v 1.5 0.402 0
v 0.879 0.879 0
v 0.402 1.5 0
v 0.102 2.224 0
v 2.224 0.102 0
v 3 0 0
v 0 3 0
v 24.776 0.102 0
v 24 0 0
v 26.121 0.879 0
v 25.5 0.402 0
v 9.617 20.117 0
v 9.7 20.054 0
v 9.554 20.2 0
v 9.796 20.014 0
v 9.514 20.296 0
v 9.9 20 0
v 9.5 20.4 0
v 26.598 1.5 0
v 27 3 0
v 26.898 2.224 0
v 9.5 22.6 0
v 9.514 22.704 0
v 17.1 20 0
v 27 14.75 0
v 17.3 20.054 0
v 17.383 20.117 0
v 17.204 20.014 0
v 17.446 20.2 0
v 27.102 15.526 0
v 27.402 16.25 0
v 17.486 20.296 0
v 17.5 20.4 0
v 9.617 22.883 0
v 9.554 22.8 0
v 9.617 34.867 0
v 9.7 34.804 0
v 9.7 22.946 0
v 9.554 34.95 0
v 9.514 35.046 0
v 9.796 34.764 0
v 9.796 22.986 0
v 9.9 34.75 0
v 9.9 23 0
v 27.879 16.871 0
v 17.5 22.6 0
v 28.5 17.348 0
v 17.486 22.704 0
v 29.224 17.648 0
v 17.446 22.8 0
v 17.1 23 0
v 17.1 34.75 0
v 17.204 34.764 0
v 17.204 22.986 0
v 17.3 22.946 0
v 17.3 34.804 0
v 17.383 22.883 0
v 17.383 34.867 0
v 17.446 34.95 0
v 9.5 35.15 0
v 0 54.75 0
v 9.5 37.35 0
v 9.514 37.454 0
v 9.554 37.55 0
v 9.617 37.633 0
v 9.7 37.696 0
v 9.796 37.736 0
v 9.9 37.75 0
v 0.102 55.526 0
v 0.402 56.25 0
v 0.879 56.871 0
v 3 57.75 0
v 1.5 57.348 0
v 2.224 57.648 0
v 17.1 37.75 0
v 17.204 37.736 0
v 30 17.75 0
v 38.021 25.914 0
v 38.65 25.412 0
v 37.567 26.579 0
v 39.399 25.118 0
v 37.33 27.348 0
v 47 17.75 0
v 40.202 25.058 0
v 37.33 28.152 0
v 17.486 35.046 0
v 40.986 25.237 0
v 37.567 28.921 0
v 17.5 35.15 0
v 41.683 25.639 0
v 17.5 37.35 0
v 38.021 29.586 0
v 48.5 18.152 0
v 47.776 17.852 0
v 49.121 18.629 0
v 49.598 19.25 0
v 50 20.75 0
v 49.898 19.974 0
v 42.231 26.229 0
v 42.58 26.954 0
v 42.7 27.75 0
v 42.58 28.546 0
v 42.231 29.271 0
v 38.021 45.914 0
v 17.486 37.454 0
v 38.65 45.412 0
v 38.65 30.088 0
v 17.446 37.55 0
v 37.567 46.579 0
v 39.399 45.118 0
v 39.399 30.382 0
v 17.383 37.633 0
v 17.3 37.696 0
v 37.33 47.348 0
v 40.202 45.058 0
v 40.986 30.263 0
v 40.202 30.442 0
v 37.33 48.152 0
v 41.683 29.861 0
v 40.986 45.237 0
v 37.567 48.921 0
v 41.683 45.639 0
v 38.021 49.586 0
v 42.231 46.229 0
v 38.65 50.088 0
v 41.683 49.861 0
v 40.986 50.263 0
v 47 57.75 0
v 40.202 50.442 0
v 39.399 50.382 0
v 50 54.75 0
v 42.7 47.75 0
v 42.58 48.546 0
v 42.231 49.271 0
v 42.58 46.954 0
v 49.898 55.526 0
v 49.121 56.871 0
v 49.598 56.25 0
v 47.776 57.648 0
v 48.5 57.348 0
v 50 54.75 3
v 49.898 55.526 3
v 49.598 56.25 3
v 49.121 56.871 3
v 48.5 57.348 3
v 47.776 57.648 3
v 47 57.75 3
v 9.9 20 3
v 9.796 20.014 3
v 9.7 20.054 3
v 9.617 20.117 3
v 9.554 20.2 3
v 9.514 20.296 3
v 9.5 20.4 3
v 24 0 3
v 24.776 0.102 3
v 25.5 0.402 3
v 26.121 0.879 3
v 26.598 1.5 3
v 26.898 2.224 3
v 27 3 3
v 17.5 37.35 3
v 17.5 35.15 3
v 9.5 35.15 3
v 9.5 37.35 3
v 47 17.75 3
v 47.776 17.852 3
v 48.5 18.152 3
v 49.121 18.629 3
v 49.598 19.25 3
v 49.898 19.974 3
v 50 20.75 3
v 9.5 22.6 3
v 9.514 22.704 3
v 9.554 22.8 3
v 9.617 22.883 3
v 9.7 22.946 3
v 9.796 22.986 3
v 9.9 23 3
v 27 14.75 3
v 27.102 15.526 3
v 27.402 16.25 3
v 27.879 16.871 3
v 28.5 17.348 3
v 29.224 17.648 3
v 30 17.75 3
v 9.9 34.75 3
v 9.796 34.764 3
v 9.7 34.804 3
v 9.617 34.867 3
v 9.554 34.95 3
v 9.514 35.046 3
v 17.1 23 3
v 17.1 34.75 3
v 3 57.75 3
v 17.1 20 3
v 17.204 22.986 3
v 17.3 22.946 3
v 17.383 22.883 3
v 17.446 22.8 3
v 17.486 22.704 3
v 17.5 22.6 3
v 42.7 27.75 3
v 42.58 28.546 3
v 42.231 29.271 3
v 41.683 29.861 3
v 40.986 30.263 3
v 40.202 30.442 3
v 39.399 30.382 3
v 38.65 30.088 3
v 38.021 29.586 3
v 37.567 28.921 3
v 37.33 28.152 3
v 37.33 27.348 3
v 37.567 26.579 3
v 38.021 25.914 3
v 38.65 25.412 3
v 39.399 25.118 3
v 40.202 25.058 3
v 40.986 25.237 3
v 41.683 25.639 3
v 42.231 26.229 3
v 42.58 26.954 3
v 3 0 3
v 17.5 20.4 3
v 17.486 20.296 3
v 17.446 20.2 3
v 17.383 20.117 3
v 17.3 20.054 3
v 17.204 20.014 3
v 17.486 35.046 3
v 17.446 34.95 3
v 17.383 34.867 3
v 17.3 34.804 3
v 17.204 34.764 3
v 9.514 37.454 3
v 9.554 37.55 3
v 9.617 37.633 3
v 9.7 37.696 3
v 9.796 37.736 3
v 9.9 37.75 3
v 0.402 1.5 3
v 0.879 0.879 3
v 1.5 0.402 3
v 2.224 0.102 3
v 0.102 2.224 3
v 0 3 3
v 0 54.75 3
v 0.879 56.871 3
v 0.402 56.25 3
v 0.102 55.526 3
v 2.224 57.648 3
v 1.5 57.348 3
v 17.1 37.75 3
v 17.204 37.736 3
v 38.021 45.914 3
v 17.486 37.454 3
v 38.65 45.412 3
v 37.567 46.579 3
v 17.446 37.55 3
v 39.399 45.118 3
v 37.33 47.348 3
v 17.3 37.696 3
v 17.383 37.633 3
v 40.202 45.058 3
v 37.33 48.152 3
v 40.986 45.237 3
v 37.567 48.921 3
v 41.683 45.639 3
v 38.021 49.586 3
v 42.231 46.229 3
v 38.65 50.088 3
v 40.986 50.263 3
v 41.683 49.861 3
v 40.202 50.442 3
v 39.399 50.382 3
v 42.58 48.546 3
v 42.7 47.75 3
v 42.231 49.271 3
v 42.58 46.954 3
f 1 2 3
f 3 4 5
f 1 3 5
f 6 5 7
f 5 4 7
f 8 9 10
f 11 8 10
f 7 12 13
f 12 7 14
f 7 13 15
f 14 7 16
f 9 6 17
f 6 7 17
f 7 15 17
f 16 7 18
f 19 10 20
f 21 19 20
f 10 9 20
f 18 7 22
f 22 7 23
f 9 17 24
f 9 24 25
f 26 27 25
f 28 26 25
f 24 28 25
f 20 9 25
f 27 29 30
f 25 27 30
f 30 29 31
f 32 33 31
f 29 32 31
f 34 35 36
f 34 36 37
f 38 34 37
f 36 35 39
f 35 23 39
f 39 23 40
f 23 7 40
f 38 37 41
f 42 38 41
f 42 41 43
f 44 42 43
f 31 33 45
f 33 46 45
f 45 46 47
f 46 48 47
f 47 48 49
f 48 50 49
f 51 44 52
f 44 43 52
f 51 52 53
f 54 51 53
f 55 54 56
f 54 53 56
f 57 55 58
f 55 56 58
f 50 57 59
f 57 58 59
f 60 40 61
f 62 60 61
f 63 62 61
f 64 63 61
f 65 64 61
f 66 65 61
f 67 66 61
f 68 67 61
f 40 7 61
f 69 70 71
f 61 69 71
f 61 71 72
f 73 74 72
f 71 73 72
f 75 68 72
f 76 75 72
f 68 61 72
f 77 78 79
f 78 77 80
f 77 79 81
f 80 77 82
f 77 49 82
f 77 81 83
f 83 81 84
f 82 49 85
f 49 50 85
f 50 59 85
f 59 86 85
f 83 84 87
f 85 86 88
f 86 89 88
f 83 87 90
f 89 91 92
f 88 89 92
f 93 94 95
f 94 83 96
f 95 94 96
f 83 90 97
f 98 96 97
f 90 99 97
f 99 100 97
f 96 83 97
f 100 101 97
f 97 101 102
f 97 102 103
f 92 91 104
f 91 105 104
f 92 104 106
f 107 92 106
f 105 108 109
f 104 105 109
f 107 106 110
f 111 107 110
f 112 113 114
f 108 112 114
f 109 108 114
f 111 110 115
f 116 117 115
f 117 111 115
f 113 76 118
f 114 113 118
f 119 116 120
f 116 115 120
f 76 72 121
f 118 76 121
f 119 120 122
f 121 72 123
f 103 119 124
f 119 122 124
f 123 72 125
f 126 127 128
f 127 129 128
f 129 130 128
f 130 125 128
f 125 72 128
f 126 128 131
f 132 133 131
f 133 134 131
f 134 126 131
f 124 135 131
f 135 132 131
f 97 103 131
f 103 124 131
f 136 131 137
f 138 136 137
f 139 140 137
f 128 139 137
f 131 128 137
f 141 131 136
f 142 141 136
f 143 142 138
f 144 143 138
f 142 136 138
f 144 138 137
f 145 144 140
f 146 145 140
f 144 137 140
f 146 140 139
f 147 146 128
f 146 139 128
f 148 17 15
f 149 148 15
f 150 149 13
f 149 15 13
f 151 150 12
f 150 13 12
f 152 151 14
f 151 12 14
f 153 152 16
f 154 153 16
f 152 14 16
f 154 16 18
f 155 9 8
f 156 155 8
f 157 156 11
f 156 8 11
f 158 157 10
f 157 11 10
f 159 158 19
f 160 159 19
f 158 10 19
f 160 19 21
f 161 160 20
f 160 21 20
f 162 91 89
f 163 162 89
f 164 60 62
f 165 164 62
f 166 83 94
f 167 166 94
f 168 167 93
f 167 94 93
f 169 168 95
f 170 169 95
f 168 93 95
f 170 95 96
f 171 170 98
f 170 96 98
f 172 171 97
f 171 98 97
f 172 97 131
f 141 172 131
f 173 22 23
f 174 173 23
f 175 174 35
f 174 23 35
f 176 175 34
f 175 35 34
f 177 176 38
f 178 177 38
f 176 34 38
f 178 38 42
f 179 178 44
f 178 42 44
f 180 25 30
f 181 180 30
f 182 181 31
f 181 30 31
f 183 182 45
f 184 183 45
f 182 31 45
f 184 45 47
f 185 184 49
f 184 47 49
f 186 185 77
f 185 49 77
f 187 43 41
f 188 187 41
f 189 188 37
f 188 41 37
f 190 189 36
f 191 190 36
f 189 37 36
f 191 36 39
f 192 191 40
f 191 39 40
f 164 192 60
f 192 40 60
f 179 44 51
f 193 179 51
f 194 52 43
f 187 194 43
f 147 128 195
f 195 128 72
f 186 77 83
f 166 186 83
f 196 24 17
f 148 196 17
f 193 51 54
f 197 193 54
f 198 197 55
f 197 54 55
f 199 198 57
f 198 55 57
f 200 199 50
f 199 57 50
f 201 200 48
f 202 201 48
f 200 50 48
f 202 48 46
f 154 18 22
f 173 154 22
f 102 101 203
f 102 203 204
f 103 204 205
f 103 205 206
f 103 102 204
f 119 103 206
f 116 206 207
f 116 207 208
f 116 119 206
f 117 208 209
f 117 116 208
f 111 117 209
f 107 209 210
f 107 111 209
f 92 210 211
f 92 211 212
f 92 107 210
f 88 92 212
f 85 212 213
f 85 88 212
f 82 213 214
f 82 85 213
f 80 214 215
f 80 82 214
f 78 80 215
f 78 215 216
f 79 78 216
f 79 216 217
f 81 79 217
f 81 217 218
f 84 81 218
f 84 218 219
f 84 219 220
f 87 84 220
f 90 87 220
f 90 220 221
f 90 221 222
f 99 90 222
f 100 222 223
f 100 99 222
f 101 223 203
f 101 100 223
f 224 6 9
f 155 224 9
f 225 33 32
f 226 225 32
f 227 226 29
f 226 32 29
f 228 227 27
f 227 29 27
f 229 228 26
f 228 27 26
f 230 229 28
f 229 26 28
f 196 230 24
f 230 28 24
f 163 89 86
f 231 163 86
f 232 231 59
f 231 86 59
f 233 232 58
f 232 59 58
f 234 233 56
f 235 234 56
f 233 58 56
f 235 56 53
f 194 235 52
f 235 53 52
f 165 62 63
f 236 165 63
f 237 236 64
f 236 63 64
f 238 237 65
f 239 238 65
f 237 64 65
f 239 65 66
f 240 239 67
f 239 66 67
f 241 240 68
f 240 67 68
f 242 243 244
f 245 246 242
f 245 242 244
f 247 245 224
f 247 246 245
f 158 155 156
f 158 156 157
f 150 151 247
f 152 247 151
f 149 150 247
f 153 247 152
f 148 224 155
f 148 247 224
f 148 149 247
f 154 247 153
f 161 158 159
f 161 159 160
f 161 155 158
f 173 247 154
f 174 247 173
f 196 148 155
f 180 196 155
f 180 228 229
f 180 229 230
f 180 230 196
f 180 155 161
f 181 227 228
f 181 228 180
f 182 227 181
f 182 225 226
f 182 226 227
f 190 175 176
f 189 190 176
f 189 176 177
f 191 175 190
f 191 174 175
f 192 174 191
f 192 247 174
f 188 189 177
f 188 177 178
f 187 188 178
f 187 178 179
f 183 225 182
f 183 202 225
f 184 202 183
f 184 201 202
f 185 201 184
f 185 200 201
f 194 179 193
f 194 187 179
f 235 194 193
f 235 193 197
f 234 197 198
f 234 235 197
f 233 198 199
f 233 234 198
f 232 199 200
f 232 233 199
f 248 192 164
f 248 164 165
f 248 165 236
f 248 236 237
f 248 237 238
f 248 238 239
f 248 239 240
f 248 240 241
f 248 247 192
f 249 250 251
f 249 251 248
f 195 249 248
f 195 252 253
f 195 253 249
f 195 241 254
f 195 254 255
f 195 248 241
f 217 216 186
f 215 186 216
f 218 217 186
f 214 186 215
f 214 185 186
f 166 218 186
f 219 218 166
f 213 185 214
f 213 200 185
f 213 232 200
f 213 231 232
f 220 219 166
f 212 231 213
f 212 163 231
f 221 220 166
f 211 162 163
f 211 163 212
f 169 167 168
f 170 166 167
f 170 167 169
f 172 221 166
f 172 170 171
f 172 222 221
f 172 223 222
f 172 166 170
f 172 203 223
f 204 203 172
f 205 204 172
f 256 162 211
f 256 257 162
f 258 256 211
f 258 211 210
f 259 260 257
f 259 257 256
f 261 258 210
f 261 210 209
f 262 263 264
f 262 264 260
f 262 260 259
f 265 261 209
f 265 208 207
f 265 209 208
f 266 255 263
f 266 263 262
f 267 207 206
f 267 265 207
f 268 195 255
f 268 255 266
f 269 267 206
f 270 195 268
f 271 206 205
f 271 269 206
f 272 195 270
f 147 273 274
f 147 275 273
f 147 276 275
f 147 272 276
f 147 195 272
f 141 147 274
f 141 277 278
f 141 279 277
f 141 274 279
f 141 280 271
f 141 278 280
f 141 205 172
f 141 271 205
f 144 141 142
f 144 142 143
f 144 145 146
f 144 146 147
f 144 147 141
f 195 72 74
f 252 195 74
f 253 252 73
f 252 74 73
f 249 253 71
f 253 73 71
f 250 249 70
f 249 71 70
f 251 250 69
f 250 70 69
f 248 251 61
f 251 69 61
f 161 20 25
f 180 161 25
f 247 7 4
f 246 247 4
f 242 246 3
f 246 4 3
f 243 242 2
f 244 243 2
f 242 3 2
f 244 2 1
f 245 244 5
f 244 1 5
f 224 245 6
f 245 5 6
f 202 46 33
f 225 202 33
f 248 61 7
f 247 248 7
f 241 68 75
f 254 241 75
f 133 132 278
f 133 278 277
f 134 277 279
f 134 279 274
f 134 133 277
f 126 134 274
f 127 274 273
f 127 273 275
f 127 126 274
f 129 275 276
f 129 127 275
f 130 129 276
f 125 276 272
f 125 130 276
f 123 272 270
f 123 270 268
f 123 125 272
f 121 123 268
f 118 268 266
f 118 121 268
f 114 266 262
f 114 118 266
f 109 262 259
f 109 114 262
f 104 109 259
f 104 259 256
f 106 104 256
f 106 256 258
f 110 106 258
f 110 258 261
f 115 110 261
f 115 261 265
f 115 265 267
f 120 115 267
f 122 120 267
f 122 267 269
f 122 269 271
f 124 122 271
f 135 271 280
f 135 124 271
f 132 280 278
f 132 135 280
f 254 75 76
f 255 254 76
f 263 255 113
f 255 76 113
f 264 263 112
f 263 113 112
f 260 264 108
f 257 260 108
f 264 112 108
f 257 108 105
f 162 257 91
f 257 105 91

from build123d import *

# Parameters (mm, degrees)
MODEL_R                         = 2.7
AUFSATZ_LINEAR_AUSTRAGEN1_DEPTH = 3


with BuildPart() as part:
    # Model → Aufsatz-Linear austragen1 (new body)
    with BuildSketch(Plane.XY):
        with BuildLine():
            Line((50, 20.75), (50, 54.75))
            ThreePointArc((50, 54.75), (49.121320344, 56.871320344), (47, 57.75))
            Line((47, 57.75), (3, 57.75))
            ThreePointArc((3, 57.75), (0.878679656, 56.871320344), (0, 54.75))
            Line((0, 54.75), (0, 3))
            ThreePointArc((0, 3), (0.878679656, 0.878679656), (3, 0))
            Line((3, 0), (24, 0))
            ThreePointArc((24, 0), (26.121320344, 0.878679656), (27, 3))
            Line((27, 3), (27, 14.75))
            ThreePointArc((27, 14.75), (27.878679656, 16.871320344), (30, 17.75))
            Line((30, 17.75), (47, 17.75))
            ThreePointArc((47, 17.75), (49.121320344, 18.628679656), (50, 20.75))
        make_face()
        with Locations((40, 27.75)):
            Circle(MODEL_R, mode=Mode.SUBTRACT)
        with Locations((40, 47.75)):
            Circle(MODEL_R, mode=Mode.SUBTRACT)
        with BuildLine():
            Line((17.1, 34.75), (9.9, 34.75))
            ThreePointArc((9.9, 34.75), (9.617157288, 34.867157288), (9.5, 35.15))
            Line((9.5, 35.15), (9.5, 37.35))
            ThreePointArc((9.5, 37.35), (9.617157288, 37.632842712), (9.9, 37.75))
            Line((9.9, 37.75), (17.1, 37.75))
            ThreePointArc((17.1, 37.75), (17.382842712, 37.632842712), (17.5, 37.35))
            Line((17.5, 37.35), (17.5, 35.15))
            ThreePointArc((17.5, 35.15), (17.382842712, 34.867157288), (17.1, 34.75))
        make_face(mode=Mode.SUBTRACT)
        with BuildLine():
            Line((17.100000028, 20.000000104), (9.900000028, 20.000000104))
            ThreePointArc((9.900000028, 20.000000104), (9.617157315, 20.117157391), (9.500000028, 20.400000104))
            Line((9.500000028, 20.400000104), (9.500000028, 22.600000104))
            ThreePointArc((9.500000028, 22.600000104), (9.617157315, 22.882842816), (9.900000028, 23.000000104))
            Line((9.900000028, 23.000000104), (17.100000028, 23.000000104))
            ThreePointArc((17.100000028, 23.000000104), (17.38284274, 22.882842816), (17.500000028, 22.600000104))
            Line((17.500000028, 22.600000104), (17.500000028, 20.400000104))
            ThreePointArc((17.500000028, 20.400000104), (17.38284274, 20.117157391), (17.100000028, 20.000000104))
        make_face(mode=Mode.SUBTRACT)
    extrude(amount=AUFSATZ_LINEAR_AUSTRAGEN1_DEPTH)


solid = part.part
